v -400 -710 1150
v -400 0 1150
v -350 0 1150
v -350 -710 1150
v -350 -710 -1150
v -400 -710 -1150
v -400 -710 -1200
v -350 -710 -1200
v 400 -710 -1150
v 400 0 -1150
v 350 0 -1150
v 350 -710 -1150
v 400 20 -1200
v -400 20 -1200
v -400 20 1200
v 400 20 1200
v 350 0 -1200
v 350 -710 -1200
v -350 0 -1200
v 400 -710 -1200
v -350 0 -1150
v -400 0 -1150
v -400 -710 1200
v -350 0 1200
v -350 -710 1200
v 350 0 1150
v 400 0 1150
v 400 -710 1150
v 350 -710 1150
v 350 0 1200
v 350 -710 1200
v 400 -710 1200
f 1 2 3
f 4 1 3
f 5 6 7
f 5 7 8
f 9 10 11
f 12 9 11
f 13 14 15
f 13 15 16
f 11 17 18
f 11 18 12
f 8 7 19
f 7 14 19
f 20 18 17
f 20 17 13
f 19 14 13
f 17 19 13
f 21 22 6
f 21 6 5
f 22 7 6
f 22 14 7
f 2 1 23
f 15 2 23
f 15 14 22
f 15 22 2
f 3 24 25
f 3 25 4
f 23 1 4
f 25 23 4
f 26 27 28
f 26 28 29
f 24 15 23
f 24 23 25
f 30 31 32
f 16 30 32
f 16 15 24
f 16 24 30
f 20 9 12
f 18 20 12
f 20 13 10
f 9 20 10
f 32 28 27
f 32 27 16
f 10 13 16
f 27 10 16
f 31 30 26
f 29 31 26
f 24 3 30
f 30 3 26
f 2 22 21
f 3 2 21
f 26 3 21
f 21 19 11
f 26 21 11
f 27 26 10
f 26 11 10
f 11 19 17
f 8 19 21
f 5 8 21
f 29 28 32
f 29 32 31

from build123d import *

# Parameters (mm, degrees)
SKETCH_1_W               = 800
SKETCH_1_H               = 2400
EXTRUDE_1_DEPTH          = 20
SKETCH_2_W               = 50
SKETCH_2_H               = 50
EXTRUDE_2_DEPTH          = 710
MIRROR_2_COPY_1_SKETCH_W = 50
MIRROR_2_COPY_1_SKETCH_H = 50
MIRROR_2_COPY_1_DEPTH    = 710


with BuildPart() as part:
    # 草图1 → 凸台-拉伸1 (new body)
    with BuildSketch(Plane(origin=(0, 0, 0), x_dir=(1, 0, 0), z_dir=(0, 1, 0))):
        Rectangle(SKETCH_1_W, SKETCH_1_H)
    extrude(amount=EXTRUDE_1_DEPTH)

    # 草图2 → 凸台-拉伸2 (add)
    with BuildSketch(Plane(origin=(0, 0, 0), x_dir=(-1, 0, 0), z_dir=(0, -1, 0))):
        with Locations((-375, -1175)):
            Rectangle(SKETCH_2_W, SKETCH_2_H)
    extrude_2 = extrude(amount=EXTRUDE_2_DEPTH)

    # 镜向1: 凸台-拉伸2 across plane
    add(extrude_2.mirror(Plane.XY))

    # 镜向2: 凸台-拉伸2 across plane
    add(extrude_2.mirror(Plane(origin=(0, 0, 0), x_dir=(0, 0, 1), z_dir=(1, 0, 0))))

    # 镜向2 copy 1 sketch → 镜向2 copy 1 (add)
    with BuildSketch(Plane.XZ):
        with Locations((-375, -1175)):
            Rectangle(MIRROR_2_COPY_1_SKETCH_W, MIRROR_2_COPY_1_SKETCH_H)
    extrude(amount=MIRROR_2_COPY_1_DEPTH)


solid = part.part
